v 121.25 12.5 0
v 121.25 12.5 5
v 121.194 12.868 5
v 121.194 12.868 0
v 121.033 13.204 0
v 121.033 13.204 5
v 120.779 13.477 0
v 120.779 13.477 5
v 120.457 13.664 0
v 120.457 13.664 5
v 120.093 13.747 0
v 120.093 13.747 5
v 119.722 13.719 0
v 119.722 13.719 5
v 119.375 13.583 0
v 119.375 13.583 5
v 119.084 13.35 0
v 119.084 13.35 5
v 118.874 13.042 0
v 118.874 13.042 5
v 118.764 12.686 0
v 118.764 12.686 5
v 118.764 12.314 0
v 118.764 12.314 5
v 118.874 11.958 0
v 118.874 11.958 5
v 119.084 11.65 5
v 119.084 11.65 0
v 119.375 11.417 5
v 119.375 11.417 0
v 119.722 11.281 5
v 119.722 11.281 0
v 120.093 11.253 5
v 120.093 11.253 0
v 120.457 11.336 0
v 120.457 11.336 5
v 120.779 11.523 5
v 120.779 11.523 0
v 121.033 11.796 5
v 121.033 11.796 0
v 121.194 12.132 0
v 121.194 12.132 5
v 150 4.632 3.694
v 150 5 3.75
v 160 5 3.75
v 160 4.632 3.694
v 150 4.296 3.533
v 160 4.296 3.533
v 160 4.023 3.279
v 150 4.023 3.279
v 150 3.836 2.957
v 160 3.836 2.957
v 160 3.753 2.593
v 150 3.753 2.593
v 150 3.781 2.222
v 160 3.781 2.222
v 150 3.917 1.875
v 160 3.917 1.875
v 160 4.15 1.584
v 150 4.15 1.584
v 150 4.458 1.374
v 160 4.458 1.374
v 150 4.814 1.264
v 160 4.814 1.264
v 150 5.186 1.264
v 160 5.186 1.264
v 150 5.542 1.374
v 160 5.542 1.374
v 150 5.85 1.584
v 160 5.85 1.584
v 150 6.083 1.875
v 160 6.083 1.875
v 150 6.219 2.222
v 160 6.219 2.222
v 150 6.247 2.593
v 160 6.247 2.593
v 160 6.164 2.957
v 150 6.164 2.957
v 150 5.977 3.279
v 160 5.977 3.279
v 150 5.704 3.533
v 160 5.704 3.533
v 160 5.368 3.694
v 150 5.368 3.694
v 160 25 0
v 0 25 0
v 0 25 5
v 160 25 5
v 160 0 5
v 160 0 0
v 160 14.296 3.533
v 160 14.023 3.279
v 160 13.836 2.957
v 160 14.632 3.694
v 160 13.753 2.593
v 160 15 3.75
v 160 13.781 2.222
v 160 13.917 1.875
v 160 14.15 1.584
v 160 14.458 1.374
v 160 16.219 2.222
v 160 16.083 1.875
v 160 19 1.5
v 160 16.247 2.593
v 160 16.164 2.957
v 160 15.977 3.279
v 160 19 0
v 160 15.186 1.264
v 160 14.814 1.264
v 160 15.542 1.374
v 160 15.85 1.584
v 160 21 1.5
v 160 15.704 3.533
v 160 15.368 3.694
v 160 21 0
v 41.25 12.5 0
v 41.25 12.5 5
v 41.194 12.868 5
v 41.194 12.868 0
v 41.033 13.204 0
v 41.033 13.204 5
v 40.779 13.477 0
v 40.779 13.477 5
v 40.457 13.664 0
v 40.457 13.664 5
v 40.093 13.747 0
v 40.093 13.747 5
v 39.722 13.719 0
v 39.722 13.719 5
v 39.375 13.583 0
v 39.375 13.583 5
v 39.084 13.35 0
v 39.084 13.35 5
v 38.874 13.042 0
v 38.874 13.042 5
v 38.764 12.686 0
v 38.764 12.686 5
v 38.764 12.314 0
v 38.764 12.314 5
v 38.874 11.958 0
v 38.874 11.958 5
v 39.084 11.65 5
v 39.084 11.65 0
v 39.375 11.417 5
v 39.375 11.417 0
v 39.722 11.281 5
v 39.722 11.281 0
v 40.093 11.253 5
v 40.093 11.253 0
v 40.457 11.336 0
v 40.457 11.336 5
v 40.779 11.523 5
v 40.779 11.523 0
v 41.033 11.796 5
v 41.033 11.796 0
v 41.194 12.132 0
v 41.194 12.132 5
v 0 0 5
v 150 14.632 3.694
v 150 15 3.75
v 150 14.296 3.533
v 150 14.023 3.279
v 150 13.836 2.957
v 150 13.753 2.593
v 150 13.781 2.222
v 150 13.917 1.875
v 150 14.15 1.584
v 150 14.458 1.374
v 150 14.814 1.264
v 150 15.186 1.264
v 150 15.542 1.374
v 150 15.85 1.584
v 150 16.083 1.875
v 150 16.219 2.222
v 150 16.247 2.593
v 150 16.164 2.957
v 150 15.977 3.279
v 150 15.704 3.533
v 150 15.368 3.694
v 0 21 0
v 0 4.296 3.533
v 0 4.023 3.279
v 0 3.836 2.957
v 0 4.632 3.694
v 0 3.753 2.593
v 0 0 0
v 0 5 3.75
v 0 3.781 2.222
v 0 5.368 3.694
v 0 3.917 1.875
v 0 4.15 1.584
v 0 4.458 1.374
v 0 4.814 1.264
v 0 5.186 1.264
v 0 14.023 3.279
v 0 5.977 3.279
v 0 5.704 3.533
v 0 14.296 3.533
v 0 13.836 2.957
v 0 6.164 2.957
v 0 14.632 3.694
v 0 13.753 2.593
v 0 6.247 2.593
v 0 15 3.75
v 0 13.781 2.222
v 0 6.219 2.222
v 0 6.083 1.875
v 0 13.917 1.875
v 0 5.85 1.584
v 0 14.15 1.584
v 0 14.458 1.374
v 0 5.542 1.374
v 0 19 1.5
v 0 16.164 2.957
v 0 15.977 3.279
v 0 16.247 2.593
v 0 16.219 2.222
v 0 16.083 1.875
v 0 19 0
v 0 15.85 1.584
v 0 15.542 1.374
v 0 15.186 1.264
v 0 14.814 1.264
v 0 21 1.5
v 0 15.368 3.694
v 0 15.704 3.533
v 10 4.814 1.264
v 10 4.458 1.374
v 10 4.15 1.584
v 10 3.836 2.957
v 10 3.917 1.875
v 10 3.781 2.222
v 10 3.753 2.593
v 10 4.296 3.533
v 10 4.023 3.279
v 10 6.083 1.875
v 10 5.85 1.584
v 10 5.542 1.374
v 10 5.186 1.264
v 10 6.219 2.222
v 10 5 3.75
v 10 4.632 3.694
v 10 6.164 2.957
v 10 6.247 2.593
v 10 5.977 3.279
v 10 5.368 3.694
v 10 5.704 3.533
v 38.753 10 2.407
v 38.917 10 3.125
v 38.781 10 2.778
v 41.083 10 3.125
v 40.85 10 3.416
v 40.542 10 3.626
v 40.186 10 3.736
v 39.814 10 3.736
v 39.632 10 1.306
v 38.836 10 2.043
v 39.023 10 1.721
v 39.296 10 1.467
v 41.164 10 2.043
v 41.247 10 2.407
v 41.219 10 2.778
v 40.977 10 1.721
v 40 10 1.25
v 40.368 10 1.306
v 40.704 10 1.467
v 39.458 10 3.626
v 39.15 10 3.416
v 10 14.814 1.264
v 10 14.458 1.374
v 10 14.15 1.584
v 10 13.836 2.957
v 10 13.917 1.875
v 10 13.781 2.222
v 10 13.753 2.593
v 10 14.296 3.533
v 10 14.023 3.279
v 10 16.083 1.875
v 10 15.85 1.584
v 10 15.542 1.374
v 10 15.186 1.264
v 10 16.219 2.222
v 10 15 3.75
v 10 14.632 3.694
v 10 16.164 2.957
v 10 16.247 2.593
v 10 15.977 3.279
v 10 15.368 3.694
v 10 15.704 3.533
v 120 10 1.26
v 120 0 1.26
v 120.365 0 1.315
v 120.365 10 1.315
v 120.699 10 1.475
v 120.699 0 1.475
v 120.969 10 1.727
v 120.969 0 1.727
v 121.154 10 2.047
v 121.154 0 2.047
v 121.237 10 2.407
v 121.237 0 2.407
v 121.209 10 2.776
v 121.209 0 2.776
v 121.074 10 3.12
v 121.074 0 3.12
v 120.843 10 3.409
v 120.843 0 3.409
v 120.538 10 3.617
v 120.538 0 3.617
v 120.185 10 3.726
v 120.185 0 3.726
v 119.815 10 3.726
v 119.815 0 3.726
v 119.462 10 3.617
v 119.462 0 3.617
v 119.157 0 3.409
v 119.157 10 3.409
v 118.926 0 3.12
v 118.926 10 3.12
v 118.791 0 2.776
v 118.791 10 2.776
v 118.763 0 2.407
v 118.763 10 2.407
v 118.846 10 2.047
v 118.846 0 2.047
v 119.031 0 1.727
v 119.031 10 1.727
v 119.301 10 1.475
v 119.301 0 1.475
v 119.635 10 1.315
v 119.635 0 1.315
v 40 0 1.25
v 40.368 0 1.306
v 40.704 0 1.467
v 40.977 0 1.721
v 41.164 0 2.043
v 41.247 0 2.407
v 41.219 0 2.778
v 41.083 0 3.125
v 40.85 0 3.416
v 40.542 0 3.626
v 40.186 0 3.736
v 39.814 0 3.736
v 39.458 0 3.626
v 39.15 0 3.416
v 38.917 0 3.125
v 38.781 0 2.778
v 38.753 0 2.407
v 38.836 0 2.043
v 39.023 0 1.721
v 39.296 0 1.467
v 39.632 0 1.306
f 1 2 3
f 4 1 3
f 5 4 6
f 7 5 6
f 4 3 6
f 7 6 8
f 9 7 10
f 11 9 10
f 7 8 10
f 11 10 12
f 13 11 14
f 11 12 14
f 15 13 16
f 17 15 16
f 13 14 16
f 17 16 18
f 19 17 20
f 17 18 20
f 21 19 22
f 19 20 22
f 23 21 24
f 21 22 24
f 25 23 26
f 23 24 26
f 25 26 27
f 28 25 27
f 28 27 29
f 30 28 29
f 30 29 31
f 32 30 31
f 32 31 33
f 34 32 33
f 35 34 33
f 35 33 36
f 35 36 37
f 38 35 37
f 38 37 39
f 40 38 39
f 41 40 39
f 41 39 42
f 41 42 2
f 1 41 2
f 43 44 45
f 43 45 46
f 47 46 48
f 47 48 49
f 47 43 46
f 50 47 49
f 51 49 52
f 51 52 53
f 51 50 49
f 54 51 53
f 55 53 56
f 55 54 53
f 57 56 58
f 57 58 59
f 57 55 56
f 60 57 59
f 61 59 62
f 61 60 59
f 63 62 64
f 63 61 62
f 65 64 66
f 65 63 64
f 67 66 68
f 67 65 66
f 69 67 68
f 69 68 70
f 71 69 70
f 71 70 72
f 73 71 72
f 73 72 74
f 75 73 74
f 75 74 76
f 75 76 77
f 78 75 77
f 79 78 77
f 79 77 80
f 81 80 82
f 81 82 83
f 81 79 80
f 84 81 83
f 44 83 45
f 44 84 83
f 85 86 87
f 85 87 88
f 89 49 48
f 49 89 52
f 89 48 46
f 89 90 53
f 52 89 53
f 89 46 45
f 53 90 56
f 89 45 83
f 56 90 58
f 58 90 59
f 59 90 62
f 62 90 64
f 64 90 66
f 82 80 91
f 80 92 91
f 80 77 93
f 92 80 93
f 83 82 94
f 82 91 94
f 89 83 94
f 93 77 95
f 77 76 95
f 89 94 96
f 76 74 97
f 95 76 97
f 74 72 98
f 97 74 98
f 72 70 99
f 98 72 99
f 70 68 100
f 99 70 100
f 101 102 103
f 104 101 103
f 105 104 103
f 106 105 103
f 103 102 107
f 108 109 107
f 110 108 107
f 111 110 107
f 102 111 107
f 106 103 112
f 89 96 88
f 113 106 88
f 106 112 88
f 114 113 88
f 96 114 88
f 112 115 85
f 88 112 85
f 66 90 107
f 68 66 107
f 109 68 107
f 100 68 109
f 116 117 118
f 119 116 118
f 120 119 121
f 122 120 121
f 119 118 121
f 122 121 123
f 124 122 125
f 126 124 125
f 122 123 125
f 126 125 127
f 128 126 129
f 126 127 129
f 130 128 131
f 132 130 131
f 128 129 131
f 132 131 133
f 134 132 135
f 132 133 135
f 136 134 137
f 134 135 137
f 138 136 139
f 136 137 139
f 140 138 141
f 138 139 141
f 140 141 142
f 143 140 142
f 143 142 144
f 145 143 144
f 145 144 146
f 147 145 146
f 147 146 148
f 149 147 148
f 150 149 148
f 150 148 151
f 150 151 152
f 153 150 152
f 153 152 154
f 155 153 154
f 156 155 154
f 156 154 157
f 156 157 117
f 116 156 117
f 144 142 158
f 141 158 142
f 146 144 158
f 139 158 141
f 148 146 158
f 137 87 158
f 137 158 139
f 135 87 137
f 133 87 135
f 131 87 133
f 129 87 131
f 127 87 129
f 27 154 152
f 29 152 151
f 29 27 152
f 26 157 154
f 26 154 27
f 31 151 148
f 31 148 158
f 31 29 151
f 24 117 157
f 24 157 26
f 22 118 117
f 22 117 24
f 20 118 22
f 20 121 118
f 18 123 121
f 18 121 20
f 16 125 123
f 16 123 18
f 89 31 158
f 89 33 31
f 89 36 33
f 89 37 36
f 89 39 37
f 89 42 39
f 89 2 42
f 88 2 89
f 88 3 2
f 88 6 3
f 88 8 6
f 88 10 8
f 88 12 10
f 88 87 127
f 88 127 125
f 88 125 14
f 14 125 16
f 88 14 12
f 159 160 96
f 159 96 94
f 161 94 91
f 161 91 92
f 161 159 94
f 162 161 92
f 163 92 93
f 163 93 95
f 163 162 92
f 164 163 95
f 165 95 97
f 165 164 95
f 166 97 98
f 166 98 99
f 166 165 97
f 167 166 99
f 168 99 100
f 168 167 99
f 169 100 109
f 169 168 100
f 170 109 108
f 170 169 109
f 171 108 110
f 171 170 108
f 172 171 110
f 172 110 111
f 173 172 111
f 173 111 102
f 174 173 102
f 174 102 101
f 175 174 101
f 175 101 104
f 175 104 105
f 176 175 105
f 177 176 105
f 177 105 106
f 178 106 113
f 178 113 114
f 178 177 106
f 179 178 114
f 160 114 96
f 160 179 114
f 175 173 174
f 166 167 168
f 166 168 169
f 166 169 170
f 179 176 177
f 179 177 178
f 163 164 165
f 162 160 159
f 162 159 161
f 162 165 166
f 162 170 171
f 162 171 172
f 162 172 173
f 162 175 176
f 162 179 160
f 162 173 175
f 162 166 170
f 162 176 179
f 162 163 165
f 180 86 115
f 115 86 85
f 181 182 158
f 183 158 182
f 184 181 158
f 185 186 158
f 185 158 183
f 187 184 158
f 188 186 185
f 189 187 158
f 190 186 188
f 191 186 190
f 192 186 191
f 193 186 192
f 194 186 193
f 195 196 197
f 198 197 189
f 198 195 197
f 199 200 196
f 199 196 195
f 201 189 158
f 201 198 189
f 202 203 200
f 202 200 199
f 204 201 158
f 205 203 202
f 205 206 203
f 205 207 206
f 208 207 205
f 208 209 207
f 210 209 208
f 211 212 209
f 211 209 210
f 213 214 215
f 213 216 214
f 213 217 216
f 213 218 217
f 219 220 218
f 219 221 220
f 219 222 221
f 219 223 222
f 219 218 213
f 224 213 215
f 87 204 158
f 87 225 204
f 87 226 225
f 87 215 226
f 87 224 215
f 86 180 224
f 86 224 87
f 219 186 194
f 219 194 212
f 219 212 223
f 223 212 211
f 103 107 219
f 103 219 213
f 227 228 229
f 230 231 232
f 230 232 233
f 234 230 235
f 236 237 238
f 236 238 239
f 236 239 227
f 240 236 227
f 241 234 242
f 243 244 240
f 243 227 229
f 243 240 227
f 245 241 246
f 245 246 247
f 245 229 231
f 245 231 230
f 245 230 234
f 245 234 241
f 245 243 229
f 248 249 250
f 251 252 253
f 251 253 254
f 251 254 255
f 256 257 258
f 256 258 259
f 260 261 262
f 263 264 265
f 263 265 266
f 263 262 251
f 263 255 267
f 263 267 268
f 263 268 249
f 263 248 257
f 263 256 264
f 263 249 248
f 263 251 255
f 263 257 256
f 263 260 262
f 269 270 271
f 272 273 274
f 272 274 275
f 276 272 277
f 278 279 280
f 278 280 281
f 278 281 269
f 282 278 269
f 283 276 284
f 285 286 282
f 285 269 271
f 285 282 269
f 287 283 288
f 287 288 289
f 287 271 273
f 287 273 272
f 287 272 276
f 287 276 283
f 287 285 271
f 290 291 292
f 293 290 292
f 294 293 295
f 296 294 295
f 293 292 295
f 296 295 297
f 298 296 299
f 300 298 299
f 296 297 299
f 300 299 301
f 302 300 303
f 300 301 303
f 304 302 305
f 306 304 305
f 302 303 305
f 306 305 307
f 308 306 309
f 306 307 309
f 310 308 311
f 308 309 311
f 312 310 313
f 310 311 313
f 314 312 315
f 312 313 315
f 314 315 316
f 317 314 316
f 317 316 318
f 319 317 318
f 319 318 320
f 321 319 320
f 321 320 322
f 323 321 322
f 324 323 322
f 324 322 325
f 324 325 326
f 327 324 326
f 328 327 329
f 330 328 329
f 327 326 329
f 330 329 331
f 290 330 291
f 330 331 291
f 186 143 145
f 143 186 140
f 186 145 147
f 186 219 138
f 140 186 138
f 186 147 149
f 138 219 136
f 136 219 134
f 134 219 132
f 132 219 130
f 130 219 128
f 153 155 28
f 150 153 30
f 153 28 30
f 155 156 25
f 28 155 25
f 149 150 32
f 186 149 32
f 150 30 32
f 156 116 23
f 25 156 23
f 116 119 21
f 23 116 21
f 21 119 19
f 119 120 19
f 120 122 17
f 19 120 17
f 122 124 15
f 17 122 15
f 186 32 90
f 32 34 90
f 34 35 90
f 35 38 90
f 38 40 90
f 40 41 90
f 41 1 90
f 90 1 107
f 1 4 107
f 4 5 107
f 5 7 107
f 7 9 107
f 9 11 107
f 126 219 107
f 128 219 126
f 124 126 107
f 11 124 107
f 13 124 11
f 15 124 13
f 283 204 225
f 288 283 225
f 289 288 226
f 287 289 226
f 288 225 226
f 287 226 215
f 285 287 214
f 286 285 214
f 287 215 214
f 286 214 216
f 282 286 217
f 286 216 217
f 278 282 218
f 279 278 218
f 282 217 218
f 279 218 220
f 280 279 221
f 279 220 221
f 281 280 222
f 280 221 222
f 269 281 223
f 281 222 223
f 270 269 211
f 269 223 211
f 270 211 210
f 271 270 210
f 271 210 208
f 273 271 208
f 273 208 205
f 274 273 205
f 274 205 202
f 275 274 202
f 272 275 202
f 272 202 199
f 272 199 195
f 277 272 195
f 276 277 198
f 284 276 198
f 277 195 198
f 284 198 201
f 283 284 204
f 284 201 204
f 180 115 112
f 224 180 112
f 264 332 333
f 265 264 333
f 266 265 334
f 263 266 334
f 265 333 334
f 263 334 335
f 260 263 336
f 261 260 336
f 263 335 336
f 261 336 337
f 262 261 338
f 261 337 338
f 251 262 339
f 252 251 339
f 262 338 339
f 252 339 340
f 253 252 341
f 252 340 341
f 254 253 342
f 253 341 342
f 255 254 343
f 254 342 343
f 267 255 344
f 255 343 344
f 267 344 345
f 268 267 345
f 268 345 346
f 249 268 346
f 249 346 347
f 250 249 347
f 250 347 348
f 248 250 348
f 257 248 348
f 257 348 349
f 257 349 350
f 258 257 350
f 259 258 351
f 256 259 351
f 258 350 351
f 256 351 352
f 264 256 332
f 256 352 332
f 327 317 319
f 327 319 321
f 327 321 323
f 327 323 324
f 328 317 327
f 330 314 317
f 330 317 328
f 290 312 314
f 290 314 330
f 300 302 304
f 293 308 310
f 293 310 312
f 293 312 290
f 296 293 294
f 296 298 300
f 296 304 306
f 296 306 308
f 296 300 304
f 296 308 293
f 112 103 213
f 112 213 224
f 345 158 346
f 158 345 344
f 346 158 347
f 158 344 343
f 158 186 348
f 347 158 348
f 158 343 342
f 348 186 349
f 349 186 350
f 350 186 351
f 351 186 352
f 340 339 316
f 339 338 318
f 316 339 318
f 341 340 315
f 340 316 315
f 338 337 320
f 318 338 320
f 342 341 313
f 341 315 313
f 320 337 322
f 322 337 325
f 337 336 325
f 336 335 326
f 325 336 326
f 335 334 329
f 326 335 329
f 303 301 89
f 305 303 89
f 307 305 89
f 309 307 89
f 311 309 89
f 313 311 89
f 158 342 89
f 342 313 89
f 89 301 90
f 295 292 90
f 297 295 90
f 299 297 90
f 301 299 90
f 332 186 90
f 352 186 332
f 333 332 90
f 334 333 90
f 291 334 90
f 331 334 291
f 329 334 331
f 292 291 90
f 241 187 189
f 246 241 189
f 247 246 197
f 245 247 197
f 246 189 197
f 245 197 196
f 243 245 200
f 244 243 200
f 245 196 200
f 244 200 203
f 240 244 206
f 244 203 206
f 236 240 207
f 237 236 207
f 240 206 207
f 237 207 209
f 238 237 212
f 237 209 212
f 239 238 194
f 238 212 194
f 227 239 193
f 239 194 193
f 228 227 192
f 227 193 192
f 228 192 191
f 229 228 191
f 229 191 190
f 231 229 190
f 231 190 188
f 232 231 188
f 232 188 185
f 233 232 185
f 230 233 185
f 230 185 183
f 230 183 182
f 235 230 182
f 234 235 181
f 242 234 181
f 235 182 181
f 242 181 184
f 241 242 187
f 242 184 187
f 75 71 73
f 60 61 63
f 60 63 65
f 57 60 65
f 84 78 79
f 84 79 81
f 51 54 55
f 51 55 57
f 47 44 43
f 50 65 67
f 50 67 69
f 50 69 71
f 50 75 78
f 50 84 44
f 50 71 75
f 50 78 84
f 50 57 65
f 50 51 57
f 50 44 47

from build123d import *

# Parameters (mm, degrees)
SKETCH1_W           = 160
SKETCH1_H           = 25
BOSS_EXTRUDE1_DEPTH = 5
SKETCH2_R           = 1.25
SKETCH2_R_2         = 1.24
CUT_EXTRUDE1_DEPTH  = 10
SKETCH5_W           = 1.5
SKETCH5_H           = 2
CUT_EXTRUDE4_DEPTH  = 163.01851746
SKETCH6_R           = 1.25
CUT_EXTRUDE5_DEPTH  = 10
SKETCH7_R           = 1.25
CUT_EXTRUDE6_DEPTH  = 10
CUT_EXTRUDE7_START  = -10
SKETCH8_R           = 1.25
CUT_EXTRUDE7_DEPTH  = 10


with BuildPart() as part:
    # Sketch1 → Boss-Extrude1 (new body)
    with BuildSketch(Plane.XY):
        with Locations((80, 12.5)):
            Rectangle(SKETCH1_W, SKETCH1_H)
    extrude(amount=BOSS_EXTRUDE1_DEPTH)

    # Sketch2 → Cut-Extrude1 (cut)
    with BuildSketch(Plane.XZ):
        with Locations(Location((40, 2.5, 0), (0, 0, 270))):
            Circle(SKETCH2_R)
        with Locations(Location((120, 2.5, 0), (0, 0, 270))):
            Circle(SKETCH2_R_2)
    extrude(amount=-CUT_EXTRUDE1_DEPTH, mode=Mode.SUBTRACT)

    # Sketch5 → Cut-Extrude4 (cut, through all)
    with BuildSketch(Plane.ZY):
        with Locations((0.75, 20)):
            Rectangle(SKETCH5_W, SKETCH5_H)
    extrude(amount=-CUT_EXTRUDE4_DEPTH, mode=Mode.SUBTRACT)

    # Sketch6 → Cut-Extrude5 (cut)
    with BuildSketch(Plane.XY.offset(5)):
        with Locations((40, 12.5)):
            Circle(SKETCH6_R)
        with Locations((120, 12.5)):
            Circle(SKETCH6_R)
    extrude(amount=-CUT_EXTRUDE5_DEPTH, mode=Mode.SUBTRACT)

    # Sketch7 → Cut-Extrude6 (cut)
    with BuildSketch(Plane.ZY):
        with Locations((2.5, 5)):
            Circle(SKETCH7_R)
        with Locations((2.5, 15)):
            Circle(SKETCH7_R)
    extrude(amount=-CUT_EXTRUDE6_DEPTH, mode=Mode.SUBTRACT)

    # Sketch8 → Cut-Extrude7 (cut)
    with BuildSketch(Plane(origin=(160, 0, 0), x_dir=(0, 0, -1), z_dir=(1, 0, 0)).offset(CUT_EXTRUDE7_START)):
        with Locations(Location((-2.5, 5, 0), (0, 0, 180))):
            Circle(SKETCH8_R)
        with Locations(Location((-2.5, 15, 0), (0, 0, 180))):
            Circle(SKETCH8_R)
    extrude(amount=CUT_EXTRUDE7_DEPTH, mode=Mode.SUBTRACT)


solid = part.part
